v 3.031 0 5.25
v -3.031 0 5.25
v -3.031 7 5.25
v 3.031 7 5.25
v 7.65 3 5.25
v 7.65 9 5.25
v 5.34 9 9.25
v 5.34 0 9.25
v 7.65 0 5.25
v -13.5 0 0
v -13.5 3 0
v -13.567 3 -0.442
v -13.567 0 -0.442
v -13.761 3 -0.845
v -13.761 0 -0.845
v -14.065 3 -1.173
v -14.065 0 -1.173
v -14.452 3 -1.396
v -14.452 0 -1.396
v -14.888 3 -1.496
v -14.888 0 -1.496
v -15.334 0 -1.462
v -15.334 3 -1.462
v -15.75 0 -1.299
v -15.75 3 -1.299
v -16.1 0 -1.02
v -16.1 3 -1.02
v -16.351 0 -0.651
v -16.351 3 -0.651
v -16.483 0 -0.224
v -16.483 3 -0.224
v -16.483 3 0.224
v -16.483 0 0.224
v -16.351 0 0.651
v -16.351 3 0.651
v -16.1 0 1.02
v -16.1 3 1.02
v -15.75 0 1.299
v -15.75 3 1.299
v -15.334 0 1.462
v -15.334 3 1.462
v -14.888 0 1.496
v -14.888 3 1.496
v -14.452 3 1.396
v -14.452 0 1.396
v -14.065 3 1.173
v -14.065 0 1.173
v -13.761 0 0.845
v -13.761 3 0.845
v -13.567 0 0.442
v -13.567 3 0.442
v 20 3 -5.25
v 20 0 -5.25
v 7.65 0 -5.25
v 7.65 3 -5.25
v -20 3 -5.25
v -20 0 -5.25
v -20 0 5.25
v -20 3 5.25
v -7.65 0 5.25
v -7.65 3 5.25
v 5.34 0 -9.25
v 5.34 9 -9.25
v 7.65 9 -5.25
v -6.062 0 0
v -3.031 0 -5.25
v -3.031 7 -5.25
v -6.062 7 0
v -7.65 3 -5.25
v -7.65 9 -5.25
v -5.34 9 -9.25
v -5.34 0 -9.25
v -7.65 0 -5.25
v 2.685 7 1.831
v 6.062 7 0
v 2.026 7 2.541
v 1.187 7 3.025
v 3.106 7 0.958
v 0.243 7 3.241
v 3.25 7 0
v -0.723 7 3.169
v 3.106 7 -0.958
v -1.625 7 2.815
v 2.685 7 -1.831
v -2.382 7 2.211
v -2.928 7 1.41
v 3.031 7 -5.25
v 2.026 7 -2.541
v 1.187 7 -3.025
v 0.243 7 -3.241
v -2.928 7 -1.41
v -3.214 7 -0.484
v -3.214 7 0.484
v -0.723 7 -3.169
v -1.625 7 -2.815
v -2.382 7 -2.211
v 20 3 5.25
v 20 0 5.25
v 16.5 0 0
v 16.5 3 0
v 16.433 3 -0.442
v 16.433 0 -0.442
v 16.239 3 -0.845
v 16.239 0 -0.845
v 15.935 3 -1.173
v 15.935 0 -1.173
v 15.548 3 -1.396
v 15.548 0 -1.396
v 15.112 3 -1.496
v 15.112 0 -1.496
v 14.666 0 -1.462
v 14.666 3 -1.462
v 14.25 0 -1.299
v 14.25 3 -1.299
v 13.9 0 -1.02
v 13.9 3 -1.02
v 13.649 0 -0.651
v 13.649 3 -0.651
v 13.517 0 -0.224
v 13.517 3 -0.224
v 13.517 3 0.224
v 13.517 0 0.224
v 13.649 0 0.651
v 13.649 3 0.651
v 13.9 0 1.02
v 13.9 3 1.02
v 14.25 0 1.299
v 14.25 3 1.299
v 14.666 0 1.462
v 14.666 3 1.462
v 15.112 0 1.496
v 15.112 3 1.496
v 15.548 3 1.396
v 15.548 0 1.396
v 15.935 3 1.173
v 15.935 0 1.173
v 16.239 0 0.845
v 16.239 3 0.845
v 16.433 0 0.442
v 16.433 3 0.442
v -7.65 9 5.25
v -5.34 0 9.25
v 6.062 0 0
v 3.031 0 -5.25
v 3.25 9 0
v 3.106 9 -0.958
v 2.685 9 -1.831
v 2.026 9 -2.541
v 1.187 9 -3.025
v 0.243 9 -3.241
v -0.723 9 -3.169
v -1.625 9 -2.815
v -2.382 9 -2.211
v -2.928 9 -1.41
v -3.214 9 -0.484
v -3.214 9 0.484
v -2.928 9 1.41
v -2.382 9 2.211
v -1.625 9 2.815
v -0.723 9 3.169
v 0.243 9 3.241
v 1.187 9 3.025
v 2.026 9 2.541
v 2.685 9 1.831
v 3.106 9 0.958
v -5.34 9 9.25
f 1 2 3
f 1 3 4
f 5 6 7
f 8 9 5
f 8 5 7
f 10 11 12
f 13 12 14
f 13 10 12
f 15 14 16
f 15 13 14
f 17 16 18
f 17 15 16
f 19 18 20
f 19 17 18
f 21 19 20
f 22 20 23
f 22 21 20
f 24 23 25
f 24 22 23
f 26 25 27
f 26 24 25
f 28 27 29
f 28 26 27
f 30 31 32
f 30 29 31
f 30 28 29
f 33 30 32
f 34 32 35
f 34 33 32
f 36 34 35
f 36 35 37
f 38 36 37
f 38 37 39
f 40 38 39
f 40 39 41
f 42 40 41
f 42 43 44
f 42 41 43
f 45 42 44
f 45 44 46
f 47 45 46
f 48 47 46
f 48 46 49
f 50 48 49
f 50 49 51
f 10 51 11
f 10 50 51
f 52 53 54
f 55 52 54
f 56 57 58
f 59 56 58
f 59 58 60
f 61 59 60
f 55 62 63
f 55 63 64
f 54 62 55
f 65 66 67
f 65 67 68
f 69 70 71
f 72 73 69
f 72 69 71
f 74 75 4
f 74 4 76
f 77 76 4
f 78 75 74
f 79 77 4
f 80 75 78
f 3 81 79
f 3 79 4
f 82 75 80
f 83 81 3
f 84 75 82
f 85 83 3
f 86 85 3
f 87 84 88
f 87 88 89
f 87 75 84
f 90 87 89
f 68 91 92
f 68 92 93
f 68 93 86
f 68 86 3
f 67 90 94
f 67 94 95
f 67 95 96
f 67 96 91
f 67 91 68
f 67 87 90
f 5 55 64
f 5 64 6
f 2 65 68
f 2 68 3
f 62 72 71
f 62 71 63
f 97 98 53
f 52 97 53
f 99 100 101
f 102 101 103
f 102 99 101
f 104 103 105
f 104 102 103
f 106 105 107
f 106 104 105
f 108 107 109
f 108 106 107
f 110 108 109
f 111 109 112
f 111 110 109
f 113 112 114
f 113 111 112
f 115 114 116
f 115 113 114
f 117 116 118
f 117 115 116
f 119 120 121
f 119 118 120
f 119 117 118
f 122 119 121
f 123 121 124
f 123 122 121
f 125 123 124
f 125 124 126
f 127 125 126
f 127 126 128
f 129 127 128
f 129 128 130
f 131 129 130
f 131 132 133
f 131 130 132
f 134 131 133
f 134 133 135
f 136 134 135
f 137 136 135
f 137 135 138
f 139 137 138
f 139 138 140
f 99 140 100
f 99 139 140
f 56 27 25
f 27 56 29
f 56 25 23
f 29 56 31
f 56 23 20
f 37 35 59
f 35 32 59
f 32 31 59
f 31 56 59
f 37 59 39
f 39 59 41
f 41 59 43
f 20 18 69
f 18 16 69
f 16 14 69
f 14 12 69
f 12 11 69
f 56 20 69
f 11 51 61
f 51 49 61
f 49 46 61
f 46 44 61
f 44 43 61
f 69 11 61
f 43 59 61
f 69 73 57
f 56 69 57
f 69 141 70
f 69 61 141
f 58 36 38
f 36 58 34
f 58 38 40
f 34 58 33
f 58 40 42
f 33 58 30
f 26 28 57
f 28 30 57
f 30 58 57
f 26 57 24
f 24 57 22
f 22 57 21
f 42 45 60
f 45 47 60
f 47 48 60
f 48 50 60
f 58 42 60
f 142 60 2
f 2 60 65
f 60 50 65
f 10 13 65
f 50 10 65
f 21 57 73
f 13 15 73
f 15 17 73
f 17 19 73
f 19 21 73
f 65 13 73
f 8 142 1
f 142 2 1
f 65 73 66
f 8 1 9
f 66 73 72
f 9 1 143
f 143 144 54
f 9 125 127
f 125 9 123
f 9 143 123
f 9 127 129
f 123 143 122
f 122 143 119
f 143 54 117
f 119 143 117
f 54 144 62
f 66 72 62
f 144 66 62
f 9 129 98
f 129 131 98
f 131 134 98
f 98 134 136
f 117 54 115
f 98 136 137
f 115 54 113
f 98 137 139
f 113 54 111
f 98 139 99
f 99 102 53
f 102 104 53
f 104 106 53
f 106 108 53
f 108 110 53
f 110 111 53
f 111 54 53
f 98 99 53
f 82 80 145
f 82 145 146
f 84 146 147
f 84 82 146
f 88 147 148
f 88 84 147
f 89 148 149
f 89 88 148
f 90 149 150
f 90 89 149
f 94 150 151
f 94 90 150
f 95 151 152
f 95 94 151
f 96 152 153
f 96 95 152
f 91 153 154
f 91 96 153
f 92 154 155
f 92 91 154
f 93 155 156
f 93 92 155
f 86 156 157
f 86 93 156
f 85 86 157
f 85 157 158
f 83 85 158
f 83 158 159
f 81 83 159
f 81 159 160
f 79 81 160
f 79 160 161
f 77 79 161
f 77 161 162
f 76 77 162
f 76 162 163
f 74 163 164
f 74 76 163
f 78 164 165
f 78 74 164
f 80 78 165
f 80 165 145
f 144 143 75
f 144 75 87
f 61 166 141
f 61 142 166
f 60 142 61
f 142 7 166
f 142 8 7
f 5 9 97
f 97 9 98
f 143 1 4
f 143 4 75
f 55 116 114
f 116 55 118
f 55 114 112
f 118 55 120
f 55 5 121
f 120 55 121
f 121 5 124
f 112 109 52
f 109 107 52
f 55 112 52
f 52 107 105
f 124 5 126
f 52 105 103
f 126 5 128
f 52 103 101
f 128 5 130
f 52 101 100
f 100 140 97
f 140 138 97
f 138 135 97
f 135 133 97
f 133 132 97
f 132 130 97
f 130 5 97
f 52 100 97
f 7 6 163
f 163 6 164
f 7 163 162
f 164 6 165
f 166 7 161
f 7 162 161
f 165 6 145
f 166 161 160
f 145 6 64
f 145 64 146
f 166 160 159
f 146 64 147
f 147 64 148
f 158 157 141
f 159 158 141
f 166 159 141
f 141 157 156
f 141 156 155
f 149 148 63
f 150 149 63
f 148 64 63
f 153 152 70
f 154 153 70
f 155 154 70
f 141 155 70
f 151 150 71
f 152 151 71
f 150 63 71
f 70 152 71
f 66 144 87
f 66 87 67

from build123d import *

# Parameters (mm, degrees)
ESQUISSE1_R             = 1.5
BOSS_EXTRU_1_DEPTH      = 7
ENL_V_MAT_EXTRU_1_REACH = 16.5
ESQUISSE2_W             = 12.350108933
ESQUISSE2_H             = 4
ESQUISSE3_R             = 3.25
BOSS_EXTRU_2_DEPTH      = 2


with BuildPart() as part:
    # Esquisse1 → Boss.-Extru.1 (new body)
    with BuildSketch(Plane(origin=(0, 0, 0), x_dir=(1, 0, 0), z_dir=(0, 1, 0))):
        Polygon((5.34048999, 9.25), (-5.34048999, 9.25), (-7.649891067, 5.25), (-20, 5.25), (-20, -5.25), (-7.649891067, -5.25), (-5.34048999, -9.25), (5.34048999, -9.25), (7.649891067, -5.25), (20, -5.25), (20, 5.25), (7.649891067, 5.25), align=None)
        with Locations((-15, 0)):
            Circle(ESQUISSE1_R, mode=Mode.SUBTRACT)
        with Locations((15, 0)):
            Circle(ESQUISSE1_R, mode=Mode.SUBTRACT)
        Polygon((6.062177826, 0), (3.031088913, 5.25), (-3.031088913, 5.25), (-6.062177826, 0), (-3.031088913, -5.25), (3.031088913, -5.25), align=None, mode=Mode.SUBTRACT)
    extrude(amount=BOSS_EXTRU_1_DEPTH)

    # Esquisse2 → Enlèv. mat.-Extru.1 (cut, up to next)
    with BuildSketch(Plane.XY.offset(5.25), mode=Mode.PRIVATE) as enl_v_mat_extru_1_sk1:
        with Locations((-13.824945533, 5)):
            Rectangle(ESQUISSE2_W, ESQUISSE2_H)
    enl_v_mat_extru_1_tool1 = extrude(enl_v_mat_extru_1_sk1.sketch, amount=-ENL_V_MAT_EXTRU_1_REACH, mode=Mode.PRIVATE) & part.part
    add(enl_v_mat_extru_1_tool1.solids().sort_by_distance((-13.824946, 5, 5.25))[0], mode=Mode.SUBTRACT)
    # Esquisse2 → Enlèv. mat.-Extru.1 (cut, up to next)
    with BuildSketch(Plane.XY.offset(5.25), mode=Mode.PRIVATE) as enl_v_mat_extru_1_sk2:
        with Locations((13.824945533, 5)):
            Rectangle(ESQUISSE2_W, ESQUISSE2_H)
    enl_v_mat_extru_1_tool2 = extrude(enl_v_mat_extru_1_sk2.sketch, amount=-ENL_V_MAT_EXTRU_1_REACH, mode=Mode.PRIVATE) & part.part
    add(enl_v_mat_extru_1_tool2.solids().sort_by_distance((13.824946, 5, 5.25))[0], mode=Mode.SUBTRACT)

    # Esquisse3 → Boss.-Extru.2 (add)
    with BuildSketch(Plane(origin=(0, 7, 0), x_dir=(1, 0, 0), z_dir=(0, 1, 0))):
        Polygon((-7.649891067, -5.25), (-7.649891067, 5.25), (-5.34048999, 9.25), (5.34048999, 9.25), (7.649891067, 5.25), (7.649891067, -5.25), (5.34048999, -9.25), (-5.34048999, -9.25), align=None)
        Circle(ESQUISSE3_R, mode=Mode.SUBTRACT)
    extrude(amount=BOSS_EXTRU_2_DEPTH)


solid = part.part
